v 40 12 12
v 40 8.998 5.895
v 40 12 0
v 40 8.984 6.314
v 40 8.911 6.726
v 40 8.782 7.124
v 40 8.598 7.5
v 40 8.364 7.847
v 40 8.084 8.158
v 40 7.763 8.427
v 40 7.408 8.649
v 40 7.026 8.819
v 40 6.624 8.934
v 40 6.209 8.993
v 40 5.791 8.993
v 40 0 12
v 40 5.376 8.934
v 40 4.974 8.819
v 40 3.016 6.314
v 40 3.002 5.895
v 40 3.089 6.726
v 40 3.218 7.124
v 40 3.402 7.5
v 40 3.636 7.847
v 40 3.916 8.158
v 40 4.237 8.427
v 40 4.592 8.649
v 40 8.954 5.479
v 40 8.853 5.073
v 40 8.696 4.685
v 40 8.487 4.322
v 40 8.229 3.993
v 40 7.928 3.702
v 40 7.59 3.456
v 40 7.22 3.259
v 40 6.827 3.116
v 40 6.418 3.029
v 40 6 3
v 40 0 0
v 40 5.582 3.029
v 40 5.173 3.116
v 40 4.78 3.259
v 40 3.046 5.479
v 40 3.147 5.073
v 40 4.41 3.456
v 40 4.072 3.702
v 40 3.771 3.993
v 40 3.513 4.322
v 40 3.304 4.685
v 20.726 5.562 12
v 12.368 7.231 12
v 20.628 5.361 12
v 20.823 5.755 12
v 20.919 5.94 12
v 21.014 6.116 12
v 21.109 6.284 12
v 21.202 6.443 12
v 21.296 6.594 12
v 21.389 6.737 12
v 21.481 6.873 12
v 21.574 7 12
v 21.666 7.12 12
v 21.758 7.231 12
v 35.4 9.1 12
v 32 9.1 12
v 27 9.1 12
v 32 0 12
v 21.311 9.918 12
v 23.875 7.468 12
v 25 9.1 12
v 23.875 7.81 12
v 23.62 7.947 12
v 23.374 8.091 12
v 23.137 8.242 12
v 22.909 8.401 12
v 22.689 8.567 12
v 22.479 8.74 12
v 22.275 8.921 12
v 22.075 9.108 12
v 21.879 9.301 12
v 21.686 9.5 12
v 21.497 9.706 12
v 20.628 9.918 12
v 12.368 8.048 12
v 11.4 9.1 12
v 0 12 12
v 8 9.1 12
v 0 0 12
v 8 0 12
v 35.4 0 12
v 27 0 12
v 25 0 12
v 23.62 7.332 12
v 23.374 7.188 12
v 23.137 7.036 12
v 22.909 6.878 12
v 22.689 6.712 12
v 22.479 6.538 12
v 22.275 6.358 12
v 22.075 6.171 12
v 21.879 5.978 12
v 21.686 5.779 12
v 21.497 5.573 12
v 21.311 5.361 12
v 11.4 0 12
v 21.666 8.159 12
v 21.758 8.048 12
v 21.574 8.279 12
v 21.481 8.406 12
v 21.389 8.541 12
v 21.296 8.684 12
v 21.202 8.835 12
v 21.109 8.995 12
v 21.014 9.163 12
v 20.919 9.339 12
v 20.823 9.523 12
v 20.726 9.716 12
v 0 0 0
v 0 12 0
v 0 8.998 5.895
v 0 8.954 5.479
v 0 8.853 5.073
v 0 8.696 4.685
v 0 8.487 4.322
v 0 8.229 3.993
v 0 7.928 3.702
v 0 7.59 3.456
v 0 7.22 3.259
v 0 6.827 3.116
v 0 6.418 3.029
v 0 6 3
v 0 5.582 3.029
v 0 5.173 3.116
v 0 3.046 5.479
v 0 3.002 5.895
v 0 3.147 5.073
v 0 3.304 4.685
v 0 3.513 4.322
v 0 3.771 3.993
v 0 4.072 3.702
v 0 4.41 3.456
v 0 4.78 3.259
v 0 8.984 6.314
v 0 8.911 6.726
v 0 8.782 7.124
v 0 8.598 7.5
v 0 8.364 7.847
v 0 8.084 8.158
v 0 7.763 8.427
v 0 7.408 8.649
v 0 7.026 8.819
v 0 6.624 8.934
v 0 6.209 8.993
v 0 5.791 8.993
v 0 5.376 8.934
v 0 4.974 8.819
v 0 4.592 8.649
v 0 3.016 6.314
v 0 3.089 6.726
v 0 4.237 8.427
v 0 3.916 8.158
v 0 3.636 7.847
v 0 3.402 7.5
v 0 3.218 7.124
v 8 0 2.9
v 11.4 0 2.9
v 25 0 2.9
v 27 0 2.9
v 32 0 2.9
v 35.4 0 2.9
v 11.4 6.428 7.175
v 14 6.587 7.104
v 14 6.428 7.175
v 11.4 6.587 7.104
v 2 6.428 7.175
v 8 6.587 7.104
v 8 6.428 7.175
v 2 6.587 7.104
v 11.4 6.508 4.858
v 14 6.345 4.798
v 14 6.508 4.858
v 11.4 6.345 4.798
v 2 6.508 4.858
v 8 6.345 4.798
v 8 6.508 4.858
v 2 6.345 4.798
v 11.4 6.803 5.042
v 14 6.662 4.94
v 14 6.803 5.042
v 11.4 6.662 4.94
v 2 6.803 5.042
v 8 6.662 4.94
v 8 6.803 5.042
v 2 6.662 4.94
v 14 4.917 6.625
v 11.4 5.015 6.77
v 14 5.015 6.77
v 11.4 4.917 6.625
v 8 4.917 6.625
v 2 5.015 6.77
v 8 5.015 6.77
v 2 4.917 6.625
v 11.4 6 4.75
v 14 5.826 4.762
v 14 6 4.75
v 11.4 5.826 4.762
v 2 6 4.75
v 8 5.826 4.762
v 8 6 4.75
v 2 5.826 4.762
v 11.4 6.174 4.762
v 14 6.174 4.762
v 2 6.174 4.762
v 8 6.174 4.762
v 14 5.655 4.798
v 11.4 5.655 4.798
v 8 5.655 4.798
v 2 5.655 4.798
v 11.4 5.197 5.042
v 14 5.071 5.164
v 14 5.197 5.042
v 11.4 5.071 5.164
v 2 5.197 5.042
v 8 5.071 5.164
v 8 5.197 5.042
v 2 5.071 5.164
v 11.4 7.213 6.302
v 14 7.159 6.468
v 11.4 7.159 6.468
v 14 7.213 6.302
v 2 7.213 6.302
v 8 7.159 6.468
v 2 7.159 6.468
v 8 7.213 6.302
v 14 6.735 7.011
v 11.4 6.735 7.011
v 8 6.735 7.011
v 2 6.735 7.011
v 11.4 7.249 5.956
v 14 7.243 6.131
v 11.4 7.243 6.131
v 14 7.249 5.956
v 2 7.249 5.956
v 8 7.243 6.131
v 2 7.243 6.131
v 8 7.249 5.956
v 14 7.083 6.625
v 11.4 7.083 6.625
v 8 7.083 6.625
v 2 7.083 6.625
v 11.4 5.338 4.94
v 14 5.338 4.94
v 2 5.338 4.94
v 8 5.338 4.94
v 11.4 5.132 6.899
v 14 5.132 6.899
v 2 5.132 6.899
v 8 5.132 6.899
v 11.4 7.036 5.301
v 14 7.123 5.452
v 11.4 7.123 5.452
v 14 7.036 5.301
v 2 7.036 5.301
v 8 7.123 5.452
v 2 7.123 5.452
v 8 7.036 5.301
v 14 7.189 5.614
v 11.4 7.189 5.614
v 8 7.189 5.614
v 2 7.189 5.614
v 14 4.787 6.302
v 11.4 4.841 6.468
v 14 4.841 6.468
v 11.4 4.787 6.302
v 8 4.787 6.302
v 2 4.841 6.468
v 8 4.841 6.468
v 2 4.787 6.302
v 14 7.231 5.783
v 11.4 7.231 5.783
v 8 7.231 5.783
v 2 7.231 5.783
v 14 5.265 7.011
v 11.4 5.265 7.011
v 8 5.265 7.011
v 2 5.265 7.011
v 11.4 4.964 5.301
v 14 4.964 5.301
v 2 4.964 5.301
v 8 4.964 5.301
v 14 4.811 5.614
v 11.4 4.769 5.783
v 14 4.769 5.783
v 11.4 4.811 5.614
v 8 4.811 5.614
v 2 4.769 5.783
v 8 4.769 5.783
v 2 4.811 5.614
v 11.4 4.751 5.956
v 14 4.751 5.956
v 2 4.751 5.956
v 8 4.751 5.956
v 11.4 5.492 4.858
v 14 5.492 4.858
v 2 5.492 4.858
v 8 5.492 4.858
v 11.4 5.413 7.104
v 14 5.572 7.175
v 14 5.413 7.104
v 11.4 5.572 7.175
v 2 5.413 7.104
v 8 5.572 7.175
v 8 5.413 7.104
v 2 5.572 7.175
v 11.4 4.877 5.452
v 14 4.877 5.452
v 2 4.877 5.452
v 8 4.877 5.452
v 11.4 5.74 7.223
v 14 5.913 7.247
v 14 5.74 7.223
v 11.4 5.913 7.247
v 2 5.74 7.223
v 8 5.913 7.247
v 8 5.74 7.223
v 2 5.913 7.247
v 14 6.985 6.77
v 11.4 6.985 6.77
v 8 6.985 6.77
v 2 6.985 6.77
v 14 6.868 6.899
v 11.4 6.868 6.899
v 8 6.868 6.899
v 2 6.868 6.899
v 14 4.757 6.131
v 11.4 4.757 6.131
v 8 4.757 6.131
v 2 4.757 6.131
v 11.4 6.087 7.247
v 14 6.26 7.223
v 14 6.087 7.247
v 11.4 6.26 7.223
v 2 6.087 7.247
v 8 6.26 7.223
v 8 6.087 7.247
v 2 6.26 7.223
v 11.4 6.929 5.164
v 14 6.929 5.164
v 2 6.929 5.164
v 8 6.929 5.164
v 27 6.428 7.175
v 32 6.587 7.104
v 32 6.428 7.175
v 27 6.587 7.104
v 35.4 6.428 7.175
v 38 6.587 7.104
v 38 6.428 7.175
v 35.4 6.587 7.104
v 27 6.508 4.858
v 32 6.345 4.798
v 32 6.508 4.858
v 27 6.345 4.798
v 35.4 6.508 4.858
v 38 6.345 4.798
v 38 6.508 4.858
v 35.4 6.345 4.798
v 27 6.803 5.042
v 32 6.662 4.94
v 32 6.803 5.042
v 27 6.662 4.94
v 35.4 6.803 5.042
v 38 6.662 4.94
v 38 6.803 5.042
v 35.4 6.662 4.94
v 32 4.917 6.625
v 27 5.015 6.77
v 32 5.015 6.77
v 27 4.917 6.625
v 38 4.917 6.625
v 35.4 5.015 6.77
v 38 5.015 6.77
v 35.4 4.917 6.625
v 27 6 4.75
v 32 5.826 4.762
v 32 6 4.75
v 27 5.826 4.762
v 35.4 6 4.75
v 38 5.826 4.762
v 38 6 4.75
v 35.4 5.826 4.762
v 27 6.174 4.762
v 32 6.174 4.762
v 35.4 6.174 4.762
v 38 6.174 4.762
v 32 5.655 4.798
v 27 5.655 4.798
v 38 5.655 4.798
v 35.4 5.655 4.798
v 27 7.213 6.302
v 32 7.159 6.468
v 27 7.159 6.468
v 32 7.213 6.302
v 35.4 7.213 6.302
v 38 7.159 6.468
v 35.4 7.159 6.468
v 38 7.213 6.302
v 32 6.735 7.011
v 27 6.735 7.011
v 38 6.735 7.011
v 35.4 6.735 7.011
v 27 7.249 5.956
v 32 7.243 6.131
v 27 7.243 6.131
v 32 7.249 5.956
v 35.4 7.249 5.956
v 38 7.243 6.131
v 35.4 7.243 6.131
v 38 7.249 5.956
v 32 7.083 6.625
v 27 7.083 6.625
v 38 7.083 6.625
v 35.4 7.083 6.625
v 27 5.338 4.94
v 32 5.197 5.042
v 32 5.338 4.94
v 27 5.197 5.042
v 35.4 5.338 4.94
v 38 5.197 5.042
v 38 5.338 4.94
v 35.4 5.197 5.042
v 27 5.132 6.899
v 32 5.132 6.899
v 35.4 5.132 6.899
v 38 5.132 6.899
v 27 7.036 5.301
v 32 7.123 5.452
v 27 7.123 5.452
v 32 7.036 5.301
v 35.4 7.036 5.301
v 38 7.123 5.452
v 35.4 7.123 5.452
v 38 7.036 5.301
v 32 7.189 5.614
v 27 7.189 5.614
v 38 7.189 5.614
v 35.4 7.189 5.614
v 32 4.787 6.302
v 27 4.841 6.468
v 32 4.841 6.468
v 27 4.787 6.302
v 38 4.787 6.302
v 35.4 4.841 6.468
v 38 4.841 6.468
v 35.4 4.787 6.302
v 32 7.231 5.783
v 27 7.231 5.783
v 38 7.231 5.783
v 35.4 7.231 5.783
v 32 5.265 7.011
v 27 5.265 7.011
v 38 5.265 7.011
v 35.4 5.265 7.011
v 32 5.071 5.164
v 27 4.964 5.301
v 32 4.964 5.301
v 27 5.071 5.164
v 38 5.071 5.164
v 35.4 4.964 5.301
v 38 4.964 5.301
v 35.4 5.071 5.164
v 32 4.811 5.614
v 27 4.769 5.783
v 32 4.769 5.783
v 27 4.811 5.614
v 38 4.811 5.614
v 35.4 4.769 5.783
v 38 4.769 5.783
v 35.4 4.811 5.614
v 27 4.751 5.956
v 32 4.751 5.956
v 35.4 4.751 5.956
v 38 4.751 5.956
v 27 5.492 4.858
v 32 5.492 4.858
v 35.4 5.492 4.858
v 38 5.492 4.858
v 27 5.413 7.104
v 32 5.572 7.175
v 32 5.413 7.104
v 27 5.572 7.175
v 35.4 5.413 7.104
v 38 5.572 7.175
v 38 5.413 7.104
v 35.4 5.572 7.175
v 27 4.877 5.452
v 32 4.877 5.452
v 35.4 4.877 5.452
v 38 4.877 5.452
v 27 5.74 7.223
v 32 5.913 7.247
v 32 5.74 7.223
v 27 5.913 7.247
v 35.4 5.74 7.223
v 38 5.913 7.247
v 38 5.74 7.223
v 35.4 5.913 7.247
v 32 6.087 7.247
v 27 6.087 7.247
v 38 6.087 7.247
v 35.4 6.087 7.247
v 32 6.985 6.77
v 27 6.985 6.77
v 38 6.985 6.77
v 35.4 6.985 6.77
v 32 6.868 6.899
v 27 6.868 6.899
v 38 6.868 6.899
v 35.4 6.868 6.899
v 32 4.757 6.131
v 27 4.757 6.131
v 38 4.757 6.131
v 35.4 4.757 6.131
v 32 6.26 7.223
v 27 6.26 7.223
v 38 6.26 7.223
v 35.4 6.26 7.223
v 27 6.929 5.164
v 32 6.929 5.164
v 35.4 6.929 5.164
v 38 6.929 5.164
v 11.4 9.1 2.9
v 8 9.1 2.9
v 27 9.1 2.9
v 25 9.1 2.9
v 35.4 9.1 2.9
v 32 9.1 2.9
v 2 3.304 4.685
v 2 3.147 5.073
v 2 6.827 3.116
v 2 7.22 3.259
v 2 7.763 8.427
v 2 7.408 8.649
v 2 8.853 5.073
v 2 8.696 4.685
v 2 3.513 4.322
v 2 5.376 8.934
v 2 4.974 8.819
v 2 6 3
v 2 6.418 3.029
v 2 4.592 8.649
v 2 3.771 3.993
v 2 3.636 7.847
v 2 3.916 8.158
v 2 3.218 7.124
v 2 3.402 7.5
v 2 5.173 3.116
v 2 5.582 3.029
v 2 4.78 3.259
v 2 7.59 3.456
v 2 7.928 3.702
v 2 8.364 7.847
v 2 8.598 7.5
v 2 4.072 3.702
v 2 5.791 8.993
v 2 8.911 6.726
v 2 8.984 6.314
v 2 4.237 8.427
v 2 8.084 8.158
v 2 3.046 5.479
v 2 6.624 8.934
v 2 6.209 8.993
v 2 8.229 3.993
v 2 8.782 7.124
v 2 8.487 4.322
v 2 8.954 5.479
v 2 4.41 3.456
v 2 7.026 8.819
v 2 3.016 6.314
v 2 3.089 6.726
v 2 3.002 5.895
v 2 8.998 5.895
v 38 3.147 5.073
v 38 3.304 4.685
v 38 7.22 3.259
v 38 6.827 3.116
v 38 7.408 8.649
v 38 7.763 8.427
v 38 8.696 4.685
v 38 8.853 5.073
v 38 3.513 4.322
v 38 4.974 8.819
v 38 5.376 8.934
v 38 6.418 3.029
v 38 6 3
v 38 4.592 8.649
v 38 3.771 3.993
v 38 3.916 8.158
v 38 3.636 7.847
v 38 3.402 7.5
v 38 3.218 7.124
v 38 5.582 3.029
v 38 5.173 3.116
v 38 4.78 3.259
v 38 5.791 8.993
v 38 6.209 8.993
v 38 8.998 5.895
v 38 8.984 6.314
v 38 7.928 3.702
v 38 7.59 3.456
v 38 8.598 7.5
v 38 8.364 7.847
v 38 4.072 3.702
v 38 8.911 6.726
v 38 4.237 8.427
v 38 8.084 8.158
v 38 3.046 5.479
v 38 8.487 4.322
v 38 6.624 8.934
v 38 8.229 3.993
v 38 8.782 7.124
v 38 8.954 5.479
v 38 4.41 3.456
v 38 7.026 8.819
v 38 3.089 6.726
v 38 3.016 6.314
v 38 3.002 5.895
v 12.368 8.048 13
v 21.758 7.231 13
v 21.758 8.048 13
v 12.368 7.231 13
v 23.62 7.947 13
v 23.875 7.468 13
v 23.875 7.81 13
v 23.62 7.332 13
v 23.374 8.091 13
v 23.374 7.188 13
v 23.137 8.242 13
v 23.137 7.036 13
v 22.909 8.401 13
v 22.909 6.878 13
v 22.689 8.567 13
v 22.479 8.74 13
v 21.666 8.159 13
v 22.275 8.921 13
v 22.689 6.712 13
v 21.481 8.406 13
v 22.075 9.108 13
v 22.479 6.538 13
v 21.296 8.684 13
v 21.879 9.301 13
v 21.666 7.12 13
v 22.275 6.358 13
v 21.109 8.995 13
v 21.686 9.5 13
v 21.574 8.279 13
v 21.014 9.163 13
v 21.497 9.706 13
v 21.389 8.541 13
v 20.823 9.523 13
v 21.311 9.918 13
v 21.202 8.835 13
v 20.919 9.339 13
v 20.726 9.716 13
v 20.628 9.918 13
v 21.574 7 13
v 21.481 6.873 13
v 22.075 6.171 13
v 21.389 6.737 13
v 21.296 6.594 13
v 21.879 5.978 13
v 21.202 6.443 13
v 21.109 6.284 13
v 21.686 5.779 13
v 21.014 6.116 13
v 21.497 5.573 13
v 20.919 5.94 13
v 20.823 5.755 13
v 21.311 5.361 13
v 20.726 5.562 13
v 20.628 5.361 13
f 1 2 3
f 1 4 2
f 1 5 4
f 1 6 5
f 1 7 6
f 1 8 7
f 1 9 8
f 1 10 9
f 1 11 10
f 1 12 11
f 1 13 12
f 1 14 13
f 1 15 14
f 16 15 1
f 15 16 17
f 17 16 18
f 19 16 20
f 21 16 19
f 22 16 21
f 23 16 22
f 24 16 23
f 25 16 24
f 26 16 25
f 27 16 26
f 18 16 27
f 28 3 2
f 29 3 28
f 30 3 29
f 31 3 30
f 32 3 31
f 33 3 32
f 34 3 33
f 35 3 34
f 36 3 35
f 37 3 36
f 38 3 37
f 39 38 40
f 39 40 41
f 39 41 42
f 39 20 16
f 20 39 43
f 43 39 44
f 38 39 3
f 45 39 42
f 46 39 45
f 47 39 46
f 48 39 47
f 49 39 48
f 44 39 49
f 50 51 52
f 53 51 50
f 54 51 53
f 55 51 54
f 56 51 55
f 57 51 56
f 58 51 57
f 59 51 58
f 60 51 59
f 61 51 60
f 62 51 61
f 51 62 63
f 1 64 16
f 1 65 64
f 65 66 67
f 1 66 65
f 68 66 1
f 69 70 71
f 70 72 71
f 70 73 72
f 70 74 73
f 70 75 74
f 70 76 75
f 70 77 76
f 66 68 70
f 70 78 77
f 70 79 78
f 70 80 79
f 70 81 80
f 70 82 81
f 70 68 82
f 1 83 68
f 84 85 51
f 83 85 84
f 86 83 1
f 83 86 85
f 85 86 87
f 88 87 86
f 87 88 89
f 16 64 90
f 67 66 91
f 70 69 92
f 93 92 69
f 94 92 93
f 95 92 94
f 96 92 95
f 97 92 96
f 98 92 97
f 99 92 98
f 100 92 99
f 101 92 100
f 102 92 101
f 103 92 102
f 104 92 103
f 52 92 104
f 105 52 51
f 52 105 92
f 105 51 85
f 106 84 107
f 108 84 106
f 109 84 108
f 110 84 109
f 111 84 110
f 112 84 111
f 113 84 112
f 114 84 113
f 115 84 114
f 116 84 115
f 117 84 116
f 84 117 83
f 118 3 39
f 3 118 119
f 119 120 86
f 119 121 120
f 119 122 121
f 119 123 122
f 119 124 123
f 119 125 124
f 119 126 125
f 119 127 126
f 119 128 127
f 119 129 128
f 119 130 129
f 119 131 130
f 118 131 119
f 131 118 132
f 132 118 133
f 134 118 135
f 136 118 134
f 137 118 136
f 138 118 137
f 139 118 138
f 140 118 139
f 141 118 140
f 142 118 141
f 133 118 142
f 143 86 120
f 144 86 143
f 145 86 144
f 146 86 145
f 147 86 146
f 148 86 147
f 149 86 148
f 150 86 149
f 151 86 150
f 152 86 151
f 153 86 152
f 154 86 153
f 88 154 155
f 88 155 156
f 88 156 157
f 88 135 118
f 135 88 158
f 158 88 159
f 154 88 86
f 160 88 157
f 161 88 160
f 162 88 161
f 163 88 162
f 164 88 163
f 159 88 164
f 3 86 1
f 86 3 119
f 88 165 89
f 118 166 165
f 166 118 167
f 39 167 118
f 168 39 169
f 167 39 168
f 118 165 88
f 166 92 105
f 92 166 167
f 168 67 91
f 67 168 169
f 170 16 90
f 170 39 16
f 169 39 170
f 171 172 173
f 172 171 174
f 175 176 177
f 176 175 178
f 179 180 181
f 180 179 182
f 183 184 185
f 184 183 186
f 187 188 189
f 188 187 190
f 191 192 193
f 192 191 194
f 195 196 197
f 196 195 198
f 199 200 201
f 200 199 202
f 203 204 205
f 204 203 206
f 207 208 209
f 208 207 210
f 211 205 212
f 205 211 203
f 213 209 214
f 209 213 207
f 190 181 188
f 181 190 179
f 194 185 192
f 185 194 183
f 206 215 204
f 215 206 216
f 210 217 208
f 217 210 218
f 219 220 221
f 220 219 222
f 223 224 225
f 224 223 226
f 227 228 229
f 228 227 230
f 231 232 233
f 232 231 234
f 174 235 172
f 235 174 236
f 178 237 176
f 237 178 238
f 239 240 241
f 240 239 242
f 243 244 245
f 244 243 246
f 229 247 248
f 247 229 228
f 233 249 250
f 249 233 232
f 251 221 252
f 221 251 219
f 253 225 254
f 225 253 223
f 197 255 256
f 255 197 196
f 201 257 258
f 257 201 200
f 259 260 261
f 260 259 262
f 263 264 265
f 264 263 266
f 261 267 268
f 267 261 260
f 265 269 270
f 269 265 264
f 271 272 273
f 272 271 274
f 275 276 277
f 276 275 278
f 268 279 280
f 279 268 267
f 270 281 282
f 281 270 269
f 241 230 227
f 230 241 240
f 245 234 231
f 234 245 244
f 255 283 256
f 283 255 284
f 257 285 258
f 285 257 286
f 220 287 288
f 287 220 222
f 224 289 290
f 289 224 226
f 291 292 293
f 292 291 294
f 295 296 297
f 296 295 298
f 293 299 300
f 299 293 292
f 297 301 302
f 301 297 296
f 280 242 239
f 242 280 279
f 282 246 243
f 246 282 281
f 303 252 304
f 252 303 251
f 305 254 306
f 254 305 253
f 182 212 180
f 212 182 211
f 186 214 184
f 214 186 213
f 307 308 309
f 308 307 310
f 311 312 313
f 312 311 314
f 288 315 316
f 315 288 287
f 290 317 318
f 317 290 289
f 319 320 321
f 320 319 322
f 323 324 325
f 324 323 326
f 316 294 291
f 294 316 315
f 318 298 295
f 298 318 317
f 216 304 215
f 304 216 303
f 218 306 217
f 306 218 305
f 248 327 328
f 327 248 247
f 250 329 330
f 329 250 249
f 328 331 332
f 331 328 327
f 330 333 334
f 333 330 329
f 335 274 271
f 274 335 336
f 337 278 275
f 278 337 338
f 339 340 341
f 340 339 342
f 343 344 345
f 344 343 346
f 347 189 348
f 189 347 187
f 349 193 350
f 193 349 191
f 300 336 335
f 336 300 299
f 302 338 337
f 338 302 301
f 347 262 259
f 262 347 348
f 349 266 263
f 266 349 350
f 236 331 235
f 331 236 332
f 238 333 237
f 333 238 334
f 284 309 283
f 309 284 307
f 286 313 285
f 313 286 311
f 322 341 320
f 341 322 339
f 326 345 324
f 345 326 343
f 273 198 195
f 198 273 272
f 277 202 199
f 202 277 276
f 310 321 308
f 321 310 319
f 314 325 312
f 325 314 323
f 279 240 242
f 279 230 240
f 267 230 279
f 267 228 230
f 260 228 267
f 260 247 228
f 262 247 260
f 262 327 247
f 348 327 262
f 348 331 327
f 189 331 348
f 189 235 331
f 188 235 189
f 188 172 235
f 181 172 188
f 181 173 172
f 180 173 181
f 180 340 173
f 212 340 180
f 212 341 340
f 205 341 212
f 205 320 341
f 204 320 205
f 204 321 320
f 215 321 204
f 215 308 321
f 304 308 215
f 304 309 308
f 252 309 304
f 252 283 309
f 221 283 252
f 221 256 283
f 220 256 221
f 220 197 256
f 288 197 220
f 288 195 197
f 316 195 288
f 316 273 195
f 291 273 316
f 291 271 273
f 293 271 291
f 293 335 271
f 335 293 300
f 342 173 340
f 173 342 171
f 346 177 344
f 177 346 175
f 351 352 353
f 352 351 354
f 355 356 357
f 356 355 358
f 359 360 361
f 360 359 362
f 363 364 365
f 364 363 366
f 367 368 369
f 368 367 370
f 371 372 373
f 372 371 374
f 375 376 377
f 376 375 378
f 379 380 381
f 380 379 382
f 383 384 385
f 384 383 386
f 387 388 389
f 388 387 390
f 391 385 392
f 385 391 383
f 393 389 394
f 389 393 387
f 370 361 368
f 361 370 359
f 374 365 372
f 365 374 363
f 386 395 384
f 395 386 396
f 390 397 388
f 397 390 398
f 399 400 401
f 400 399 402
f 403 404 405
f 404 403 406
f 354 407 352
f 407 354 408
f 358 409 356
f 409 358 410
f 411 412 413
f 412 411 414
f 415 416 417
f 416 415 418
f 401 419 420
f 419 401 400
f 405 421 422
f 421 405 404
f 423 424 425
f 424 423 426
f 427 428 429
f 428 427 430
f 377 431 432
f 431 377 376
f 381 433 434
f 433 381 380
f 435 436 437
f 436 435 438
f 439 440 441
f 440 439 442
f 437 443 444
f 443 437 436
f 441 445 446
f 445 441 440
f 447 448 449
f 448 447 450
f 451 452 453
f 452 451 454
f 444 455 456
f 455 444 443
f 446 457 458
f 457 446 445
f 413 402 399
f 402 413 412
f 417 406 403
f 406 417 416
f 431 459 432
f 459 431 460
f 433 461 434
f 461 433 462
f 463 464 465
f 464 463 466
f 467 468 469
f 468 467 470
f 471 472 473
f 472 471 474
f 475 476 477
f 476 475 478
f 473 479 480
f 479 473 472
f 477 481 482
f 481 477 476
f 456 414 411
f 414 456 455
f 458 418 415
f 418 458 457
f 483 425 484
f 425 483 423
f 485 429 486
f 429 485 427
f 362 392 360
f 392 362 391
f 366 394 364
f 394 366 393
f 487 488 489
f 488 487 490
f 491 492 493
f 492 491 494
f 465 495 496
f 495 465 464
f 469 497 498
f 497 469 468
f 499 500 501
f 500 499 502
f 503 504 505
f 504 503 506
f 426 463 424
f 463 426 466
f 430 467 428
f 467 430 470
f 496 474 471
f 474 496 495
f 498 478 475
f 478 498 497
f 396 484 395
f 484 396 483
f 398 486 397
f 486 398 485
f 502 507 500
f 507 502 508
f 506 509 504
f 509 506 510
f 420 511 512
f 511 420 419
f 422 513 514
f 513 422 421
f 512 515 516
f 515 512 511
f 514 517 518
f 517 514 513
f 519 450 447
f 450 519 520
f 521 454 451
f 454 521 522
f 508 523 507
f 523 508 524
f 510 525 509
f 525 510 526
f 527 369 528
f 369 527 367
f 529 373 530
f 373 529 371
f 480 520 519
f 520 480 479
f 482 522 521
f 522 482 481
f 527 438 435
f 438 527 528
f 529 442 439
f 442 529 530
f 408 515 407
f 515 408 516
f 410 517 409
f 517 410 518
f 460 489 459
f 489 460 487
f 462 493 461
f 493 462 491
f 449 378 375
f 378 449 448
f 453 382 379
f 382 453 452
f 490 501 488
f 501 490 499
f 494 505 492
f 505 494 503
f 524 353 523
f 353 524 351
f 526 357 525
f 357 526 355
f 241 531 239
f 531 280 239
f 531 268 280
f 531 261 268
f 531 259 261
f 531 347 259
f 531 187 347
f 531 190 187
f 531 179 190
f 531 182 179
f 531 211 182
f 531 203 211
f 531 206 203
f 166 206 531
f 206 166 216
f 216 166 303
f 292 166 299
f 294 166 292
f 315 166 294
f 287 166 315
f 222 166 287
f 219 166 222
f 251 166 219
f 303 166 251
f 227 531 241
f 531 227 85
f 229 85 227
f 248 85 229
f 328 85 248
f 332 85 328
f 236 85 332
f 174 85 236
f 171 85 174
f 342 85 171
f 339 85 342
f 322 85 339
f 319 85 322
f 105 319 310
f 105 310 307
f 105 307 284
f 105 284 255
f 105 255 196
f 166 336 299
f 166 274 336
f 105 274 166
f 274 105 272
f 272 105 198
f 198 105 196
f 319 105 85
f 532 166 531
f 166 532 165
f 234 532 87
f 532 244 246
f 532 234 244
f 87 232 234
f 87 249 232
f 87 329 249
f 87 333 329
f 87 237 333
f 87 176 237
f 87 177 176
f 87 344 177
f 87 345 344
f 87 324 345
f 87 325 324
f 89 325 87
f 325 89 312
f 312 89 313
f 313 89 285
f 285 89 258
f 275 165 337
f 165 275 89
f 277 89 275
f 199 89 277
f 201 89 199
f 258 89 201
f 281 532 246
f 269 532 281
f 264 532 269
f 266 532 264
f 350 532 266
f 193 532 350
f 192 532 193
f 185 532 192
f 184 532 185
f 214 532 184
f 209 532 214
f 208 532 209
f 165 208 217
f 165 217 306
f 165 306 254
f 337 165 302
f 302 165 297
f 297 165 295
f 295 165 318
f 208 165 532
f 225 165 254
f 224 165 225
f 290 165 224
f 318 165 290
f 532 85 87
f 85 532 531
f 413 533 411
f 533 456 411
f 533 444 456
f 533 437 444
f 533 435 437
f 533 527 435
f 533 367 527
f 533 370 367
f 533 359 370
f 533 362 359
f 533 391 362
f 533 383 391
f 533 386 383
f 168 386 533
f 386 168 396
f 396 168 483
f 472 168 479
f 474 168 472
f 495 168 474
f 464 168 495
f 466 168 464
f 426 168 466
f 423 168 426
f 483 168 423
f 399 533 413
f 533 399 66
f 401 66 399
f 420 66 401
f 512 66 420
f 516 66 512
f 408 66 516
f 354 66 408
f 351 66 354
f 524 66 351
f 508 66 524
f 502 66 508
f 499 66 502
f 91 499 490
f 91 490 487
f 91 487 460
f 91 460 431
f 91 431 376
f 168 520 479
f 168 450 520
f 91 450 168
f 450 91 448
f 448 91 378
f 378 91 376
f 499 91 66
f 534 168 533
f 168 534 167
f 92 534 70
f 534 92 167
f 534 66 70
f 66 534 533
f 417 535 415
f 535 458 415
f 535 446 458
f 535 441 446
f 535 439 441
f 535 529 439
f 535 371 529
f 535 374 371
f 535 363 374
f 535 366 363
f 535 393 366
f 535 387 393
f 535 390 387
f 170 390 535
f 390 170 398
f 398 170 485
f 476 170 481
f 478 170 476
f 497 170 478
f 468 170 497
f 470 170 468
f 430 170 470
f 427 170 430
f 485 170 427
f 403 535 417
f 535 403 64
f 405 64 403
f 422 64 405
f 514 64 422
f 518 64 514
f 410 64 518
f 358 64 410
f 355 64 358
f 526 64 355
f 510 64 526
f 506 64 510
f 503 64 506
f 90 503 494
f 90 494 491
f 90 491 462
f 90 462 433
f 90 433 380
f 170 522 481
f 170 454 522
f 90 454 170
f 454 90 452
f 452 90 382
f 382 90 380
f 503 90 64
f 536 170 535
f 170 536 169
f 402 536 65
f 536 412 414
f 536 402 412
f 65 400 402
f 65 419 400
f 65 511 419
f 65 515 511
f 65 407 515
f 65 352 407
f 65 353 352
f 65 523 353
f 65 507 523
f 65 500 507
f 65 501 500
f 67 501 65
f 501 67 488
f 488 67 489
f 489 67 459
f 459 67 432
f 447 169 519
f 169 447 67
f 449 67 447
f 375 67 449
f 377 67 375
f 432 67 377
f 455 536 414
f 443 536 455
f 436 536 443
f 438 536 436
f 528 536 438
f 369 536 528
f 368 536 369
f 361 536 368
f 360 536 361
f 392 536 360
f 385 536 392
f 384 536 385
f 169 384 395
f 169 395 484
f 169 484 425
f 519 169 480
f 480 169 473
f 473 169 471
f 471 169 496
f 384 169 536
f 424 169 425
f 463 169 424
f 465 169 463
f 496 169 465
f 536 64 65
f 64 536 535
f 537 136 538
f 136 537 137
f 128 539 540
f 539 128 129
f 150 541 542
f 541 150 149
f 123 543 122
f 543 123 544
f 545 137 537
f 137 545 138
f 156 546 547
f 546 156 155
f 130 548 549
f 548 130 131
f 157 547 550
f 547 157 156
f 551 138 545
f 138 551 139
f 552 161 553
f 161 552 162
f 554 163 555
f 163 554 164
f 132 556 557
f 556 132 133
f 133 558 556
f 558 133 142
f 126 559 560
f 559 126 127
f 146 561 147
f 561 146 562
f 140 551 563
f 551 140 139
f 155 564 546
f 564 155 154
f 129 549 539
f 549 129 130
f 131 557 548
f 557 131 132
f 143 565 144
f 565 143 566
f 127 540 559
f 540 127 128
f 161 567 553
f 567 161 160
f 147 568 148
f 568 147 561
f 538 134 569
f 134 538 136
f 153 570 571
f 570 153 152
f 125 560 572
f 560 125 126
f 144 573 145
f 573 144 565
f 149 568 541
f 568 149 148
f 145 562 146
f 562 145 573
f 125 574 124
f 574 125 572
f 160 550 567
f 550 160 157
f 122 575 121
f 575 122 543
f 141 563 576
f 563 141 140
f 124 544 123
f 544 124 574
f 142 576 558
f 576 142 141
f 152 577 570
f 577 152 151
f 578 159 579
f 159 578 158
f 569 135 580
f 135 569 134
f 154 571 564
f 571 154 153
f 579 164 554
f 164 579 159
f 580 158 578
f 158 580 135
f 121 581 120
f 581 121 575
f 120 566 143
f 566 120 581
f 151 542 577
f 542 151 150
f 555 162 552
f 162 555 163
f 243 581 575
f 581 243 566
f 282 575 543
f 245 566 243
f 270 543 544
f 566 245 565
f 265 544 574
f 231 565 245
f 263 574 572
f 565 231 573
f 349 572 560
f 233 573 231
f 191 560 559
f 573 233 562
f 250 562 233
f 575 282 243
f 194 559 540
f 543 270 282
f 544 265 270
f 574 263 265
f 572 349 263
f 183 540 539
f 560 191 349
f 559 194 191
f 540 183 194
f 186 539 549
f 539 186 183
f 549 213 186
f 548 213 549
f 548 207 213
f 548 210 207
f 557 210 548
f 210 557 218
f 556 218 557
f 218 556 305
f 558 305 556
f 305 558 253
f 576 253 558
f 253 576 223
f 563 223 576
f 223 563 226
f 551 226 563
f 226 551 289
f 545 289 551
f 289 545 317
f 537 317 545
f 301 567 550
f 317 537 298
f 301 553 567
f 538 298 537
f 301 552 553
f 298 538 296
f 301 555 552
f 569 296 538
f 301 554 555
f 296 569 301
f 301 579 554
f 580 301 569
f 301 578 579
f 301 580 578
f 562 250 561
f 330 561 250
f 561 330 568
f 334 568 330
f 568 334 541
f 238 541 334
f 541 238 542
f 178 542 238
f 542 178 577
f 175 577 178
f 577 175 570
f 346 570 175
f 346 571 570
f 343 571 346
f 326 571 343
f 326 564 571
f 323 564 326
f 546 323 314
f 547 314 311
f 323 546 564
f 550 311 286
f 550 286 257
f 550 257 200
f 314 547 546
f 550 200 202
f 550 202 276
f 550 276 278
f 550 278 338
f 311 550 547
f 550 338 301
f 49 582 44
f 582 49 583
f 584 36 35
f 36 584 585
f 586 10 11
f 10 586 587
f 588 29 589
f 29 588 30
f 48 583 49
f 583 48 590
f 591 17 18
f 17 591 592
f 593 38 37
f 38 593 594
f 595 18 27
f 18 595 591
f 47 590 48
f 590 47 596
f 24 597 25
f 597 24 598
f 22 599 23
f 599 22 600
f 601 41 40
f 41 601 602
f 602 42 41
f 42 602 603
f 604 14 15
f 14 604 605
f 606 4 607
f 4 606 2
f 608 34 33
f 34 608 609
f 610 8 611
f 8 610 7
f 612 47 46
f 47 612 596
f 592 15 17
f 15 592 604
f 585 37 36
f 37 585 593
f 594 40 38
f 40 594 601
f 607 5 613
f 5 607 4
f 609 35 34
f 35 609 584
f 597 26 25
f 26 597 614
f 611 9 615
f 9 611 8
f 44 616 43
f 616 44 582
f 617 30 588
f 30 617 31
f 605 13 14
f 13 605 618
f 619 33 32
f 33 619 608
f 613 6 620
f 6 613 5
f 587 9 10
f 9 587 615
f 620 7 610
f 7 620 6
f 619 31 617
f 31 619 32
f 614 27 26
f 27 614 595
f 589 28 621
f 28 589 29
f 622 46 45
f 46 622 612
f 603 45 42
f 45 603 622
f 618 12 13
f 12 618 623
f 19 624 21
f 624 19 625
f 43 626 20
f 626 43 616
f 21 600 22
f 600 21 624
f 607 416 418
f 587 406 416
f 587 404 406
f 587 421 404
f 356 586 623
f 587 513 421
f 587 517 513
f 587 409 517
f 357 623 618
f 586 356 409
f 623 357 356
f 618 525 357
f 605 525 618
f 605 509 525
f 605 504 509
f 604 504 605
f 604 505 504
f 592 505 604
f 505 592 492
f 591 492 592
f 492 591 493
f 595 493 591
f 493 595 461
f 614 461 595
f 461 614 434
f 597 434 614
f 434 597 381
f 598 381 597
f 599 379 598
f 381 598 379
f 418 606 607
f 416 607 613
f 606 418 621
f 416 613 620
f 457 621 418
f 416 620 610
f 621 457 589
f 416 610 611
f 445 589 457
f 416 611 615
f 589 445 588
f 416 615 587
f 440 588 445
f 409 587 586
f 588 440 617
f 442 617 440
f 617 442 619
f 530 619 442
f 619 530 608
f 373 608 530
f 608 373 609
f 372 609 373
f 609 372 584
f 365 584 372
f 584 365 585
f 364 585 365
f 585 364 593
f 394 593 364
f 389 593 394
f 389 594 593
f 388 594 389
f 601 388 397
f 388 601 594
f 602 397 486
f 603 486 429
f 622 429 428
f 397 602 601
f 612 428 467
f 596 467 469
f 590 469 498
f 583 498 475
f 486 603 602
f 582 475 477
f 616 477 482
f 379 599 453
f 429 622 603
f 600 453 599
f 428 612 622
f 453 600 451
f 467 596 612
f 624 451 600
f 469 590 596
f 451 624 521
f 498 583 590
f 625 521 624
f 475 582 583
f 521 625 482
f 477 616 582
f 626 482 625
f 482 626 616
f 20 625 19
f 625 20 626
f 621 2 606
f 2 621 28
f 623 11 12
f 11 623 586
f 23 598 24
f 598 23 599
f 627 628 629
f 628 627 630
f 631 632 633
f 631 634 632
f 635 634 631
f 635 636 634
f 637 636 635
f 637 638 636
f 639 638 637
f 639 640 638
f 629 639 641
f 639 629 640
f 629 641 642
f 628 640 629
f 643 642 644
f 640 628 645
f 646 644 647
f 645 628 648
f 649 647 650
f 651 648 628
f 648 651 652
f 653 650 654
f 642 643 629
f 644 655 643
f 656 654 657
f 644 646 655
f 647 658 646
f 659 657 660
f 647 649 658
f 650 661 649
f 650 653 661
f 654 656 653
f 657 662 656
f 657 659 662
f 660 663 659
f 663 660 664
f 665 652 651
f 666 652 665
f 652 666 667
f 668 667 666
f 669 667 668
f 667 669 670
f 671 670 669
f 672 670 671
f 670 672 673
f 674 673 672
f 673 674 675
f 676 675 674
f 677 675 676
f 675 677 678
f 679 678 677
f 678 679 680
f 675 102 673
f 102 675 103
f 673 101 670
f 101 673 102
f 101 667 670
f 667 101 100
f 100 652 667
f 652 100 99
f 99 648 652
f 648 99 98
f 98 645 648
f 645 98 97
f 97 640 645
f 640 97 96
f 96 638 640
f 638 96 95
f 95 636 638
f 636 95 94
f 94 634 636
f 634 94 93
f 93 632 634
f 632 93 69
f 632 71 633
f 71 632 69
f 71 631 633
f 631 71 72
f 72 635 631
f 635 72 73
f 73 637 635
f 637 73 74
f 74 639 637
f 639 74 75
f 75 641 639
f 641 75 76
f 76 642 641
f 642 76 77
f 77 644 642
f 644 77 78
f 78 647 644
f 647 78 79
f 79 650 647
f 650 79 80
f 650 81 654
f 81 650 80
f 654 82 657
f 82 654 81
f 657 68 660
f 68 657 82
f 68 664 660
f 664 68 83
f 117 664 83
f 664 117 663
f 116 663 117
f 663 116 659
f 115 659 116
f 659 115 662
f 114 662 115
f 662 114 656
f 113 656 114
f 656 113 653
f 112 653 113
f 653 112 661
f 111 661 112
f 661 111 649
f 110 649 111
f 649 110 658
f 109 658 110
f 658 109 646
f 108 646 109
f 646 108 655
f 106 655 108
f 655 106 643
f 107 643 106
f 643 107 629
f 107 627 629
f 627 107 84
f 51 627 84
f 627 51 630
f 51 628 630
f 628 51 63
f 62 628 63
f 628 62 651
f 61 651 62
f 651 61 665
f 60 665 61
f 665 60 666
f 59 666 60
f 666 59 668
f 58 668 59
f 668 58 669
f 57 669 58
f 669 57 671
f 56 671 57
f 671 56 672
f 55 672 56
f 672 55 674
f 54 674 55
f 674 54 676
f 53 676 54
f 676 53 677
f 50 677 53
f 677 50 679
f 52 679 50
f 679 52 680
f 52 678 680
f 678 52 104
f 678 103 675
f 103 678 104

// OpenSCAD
// corner.scad
// Ramon Ricca 2025

$fn=45;
length=40;
width=12;
counter=6;

difference() {
    // Main Cube
    cube([length, width, width]);
    
    // Screw Tap Left
    translate([-1,width/2,width/2]) rotate([0,90,0]) cylinder(h=15, d=2.5);
    // Screw Tap Right
    translate([length-14,width/2,width/2]) rotate([0,90,0]) cylinder(h=15, d=2.5);
    
    // Bottom Panel Cut
    translate([8,-1,2.9]) cube([3.4,10.1,15]);
    // PCB Cut
    translate([25,-1,2.9]) cube([2,10.1,15]);
    // Top Panel Cut
    translate([32,-1,2.9]) cube([3.4,10.1,15]);
    
    // Left Countersink
    translate([-1,width/2,width/2]) rotate([0,90,0]) cylinder(h=3, d=counter);
    // Right Countersink
    translate([length-2,width/2,width/2]) rotate([0,90,0]) cylinder(h=6, d=counter);
    //translate([39.9,11.8,5.6]) rotate([-90,270,0]) linear_extrude(height=10) text("MIXTAPE", size=4.2, font="Noto Sans:Bold", direction="ttb", spacing=0.7);
}

// Arrow
translate([8.4,2,10]) rotate([0,0,0]) linear_extrude(height=3) text("\u2192", size=14);

 
